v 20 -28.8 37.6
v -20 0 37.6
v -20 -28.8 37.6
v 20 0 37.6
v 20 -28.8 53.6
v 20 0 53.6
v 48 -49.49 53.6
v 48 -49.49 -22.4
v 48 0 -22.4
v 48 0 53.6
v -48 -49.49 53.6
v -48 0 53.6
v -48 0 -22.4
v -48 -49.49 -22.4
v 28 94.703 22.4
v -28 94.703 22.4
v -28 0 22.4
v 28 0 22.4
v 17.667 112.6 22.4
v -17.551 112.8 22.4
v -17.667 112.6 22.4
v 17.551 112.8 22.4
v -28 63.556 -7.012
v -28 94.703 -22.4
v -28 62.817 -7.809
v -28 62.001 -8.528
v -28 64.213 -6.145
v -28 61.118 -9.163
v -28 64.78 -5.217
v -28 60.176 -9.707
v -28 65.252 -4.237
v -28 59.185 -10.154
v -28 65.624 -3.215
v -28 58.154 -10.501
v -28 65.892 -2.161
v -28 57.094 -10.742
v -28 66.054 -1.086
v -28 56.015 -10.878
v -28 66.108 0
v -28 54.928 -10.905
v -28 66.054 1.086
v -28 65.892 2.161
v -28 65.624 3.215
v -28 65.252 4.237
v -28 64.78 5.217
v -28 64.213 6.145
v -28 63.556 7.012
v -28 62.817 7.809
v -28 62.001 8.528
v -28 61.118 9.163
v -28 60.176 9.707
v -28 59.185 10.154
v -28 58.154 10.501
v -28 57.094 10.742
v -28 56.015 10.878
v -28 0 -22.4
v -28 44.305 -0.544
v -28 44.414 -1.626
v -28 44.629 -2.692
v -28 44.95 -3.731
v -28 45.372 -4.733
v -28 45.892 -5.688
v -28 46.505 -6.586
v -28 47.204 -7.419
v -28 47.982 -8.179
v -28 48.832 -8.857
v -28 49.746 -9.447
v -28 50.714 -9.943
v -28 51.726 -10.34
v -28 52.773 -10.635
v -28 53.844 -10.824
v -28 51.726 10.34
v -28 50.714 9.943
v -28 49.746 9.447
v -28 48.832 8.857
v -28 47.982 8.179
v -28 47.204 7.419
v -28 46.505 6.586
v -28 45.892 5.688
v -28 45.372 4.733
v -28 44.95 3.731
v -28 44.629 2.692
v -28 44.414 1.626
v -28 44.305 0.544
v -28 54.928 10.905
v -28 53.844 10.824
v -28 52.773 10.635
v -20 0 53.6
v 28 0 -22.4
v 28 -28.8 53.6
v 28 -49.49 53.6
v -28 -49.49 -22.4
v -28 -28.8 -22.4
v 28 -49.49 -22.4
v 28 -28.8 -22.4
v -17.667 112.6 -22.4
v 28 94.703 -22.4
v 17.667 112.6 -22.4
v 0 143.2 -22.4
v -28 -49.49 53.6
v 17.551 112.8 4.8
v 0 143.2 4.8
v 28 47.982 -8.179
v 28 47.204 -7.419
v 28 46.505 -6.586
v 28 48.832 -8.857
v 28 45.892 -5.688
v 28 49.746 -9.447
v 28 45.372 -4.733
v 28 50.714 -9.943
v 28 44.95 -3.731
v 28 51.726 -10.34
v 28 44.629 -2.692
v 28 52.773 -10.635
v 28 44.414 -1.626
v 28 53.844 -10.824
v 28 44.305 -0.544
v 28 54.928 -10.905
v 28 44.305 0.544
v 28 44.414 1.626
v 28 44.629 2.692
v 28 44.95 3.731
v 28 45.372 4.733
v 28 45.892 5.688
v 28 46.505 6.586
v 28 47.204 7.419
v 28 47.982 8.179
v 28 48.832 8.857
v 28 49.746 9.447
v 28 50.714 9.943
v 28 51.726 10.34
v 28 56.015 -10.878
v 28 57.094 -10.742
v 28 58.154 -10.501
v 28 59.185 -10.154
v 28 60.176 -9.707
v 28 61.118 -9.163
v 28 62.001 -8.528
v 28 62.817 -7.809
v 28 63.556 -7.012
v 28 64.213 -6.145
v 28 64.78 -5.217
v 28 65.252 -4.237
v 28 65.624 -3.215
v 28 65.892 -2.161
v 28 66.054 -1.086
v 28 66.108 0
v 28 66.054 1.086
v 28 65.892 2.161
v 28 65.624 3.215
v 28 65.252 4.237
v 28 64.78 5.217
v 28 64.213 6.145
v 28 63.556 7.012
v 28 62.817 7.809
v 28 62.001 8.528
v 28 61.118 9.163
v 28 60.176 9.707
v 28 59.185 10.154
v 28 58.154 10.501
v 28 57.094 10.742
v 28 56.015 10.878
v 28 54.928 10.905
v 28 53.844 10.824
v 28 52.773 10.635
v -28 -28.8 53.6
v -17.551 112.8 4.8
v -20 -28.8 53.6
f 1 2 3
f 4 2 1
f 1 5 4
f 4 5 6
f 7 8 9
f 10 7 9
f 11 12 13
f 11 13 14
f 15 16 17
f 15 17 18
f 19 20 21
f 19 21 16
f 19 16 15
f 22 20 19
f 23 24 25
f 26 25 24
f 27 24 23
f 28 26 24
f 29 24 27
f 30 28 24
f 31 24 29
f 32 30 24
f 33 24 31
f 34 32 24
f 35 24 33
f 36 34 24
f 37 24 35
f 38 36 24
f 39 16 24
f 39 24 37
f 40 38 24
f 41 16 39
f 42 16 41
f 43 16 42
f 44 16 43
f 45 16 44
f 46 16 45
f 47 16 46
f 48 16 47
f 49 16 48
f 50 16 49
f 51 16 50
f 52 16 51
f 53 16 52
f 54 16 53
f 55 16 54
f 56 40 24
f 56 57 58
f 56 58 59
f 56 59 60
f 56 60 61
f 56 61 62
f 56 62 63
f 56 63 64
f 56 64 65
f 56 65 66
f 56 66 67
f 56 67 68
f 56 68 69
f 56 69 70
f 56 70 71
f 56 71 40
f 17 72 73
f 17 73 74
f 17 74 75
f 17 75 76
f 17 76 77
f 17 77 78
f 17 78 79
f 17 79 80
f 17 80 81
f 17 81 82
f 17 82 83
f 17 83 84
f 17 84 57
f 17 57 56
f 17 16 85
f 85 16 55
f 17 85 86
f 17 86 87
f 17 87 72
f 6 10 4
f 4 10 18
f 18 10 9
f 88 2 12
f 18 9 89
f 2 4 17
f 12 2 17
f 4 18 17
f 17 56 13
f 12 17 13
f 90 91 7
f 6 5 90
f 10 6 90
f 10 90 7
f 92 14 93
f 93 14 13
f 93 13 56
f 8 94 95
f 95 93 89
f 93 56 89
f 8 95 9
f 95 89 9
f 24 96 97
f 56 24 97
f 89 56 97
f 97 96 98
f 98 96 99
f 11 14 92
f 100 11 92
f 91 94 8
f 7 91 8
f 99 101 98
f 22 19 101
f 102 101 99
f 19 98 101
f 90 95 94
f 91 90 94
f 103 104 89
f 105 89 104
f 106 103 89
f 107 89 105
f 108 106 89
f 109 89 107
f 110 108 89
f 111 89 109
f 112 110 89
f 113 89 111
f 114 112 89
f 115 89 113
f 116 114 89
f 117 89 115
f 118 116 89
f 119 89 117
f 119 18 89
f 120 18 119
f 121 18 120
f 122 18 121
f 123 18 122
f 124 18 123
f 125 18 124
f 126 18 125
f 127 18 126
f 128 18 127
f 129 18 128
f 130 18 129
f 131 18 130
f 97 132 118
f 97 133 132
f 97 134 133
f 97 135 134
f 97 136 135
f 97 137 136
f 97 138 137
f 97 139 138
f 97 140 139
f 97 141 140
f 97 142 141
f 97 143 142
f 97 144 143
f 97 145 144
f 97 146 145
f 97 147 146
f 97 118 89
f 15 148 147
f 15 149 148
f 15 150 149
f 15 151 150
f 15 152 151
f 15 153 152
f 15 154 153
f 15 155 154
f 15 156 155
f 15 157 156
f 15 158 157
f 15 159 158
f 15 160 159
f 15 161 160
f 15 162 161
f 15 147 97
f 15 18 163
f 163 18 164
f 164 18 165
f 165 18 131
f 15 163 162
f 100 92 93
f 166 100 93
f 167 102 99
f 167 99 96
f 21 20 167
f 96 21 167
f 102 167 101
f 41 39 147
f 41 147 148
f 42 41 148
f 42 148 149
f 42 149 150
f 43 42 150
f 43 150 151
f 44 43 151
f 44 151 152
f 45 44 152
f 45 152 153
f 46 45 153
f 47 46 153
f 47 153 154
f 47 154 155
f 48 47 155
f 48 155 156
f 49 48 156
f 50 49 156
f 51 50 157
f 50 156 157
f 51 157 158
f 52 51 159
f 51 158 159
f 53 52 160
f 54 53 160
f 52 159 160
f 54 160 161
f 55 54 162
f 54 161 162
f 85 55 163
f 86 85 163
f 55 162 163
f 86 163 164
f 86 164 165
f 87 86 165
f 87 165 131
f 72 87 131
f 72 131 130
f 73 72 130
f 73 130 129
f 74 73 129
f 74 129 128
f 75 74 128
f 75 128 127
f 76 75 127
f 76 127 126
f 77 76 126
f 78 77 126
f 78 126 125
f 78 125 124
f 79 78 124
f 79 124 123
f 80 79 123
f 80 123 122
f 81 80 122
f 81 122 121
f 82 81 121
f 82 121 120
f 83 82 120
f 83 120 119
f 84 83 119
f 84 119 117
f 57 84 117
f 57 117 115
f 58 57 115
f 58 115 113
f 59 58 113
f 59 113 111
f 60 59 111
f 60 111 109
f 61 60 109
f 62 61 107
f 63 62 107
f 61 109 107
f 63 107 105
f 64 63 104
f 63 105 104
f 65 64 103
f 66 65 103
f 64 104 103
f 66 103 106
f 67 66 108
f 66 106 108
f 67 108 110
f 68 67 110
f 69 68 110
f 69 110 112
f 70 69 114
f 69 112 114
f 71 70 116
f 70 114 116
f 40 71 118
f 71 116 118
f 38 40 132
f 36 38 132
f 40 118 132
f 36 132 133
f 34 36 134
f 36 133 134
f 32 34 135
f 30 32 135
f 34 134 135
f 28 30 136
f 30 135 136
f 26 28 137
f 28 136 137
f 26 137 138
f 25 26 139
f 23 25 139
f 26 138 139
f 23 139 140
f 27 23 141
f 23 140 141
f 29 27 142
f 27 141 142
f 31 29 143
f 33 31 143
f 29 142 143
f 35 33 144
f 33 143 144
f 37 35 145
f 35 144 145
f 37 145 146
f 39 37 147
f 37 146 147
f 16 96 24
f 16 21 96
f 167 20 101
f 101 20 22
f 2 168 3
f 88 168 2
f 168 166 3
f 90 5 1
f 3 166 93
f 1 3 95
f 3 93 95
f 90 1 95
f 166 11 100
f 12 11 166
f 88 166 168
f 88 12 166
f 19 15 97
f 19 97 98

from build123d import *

# Parameters (mm, degrees)
BOSS_EXTRUDE1_DEPTH      = 22.4
SKETCH2_R                = 10.908211602
CUT_EXTRUDE1_DEPTH       = 156.383396796
SKETCH3_W                = 70.975037356
SKETCH3_H                = 39.358884352
CUT_EXTRUDE2_DEPTH       = 17.6
BOSS_EXTRUDE3_DEPTH      = 53.6
BOSS_EXTRUDE3_DEPTH_BACK = 22.4
SKETCH7_W                = 40
SKETCH7_H                = 93.823615884
CUT_EXTRUDE4_DEPTH       = 16


with BuildPart() as part:
    # Sketch1 → Boss-Extrude1 (new, symmetric)
    with BuildSketch(Plane.XY):
        Polygon((-17.666918237, 112.6), (-28, 94.702577388), (-28, 0), (0, 0), (28, 0), (28, 94.702577388), (17.666918237, 112.6), (0, 143.2), align=None)
    extrude(amount=BOSS_EXTRUDE1_DEPTH, both=True)

    # Sketch2 → Cut-Extrude1 (cut, through all)
    with BuildSketch(Plane(origin=(28, 0, 0), x_dir=(0, 0, -1), z_dir=(1, 0, 0))):
        with Locations(Location((0, 55.2, 0), (0, 0, 90))):
            Circle(SKETCH2_R)
    extrude(amount=-CUT_EXTRUDE1_DEPTH, mode=Mode.SUBTRACT)

    # Sketch3 → Cut-Extrude2 (cut)
    with BuildSketch(Plane.XY.offset(22.4)):
        with Locations((-1.700797659, 132.479442176)):
            Rectangle(SKETCH3_W, SKETCH3_H)
    extrude(amount=-CUT_EXTRUDE2_DEPTH, mode=Mode.SUBTRACT)

    # Sketch4 → Boss-Extrude3 (add, two sides: drawn at the far end of the back side and taken through both)
    with BuildSketch(Plane.XY.offset(-BOSS_EXTRUDE3_DEPTH_BACK)):
        Polygon((0, 0), (-28, 0), (-48, 0), (-48, -49.489884121), (-28, -49.489884121), (-28, -28.8), (28, -28.8), (28, -49.489884121), (48, -49.489884121), (48, 0), (28, 0), align=None)
    extrude(amount=BOSS_EXTRUDE3_DEPTH + BOSS_EXTRUDE3_DEPTH_BACK)

    # Sketch7 → Cut-Extrude4 (cut)
    with BuildSketch(Plane.XY.offset(53.6)):
        with Locations((0, -14.4)):
            Rectangle(SKETCH7_W, SKETCH7_H)
    extrude(amount=-CUT_EXTRUDE4_DEPTH, mode=Mode.SUBTRACT)


solid = part.part
